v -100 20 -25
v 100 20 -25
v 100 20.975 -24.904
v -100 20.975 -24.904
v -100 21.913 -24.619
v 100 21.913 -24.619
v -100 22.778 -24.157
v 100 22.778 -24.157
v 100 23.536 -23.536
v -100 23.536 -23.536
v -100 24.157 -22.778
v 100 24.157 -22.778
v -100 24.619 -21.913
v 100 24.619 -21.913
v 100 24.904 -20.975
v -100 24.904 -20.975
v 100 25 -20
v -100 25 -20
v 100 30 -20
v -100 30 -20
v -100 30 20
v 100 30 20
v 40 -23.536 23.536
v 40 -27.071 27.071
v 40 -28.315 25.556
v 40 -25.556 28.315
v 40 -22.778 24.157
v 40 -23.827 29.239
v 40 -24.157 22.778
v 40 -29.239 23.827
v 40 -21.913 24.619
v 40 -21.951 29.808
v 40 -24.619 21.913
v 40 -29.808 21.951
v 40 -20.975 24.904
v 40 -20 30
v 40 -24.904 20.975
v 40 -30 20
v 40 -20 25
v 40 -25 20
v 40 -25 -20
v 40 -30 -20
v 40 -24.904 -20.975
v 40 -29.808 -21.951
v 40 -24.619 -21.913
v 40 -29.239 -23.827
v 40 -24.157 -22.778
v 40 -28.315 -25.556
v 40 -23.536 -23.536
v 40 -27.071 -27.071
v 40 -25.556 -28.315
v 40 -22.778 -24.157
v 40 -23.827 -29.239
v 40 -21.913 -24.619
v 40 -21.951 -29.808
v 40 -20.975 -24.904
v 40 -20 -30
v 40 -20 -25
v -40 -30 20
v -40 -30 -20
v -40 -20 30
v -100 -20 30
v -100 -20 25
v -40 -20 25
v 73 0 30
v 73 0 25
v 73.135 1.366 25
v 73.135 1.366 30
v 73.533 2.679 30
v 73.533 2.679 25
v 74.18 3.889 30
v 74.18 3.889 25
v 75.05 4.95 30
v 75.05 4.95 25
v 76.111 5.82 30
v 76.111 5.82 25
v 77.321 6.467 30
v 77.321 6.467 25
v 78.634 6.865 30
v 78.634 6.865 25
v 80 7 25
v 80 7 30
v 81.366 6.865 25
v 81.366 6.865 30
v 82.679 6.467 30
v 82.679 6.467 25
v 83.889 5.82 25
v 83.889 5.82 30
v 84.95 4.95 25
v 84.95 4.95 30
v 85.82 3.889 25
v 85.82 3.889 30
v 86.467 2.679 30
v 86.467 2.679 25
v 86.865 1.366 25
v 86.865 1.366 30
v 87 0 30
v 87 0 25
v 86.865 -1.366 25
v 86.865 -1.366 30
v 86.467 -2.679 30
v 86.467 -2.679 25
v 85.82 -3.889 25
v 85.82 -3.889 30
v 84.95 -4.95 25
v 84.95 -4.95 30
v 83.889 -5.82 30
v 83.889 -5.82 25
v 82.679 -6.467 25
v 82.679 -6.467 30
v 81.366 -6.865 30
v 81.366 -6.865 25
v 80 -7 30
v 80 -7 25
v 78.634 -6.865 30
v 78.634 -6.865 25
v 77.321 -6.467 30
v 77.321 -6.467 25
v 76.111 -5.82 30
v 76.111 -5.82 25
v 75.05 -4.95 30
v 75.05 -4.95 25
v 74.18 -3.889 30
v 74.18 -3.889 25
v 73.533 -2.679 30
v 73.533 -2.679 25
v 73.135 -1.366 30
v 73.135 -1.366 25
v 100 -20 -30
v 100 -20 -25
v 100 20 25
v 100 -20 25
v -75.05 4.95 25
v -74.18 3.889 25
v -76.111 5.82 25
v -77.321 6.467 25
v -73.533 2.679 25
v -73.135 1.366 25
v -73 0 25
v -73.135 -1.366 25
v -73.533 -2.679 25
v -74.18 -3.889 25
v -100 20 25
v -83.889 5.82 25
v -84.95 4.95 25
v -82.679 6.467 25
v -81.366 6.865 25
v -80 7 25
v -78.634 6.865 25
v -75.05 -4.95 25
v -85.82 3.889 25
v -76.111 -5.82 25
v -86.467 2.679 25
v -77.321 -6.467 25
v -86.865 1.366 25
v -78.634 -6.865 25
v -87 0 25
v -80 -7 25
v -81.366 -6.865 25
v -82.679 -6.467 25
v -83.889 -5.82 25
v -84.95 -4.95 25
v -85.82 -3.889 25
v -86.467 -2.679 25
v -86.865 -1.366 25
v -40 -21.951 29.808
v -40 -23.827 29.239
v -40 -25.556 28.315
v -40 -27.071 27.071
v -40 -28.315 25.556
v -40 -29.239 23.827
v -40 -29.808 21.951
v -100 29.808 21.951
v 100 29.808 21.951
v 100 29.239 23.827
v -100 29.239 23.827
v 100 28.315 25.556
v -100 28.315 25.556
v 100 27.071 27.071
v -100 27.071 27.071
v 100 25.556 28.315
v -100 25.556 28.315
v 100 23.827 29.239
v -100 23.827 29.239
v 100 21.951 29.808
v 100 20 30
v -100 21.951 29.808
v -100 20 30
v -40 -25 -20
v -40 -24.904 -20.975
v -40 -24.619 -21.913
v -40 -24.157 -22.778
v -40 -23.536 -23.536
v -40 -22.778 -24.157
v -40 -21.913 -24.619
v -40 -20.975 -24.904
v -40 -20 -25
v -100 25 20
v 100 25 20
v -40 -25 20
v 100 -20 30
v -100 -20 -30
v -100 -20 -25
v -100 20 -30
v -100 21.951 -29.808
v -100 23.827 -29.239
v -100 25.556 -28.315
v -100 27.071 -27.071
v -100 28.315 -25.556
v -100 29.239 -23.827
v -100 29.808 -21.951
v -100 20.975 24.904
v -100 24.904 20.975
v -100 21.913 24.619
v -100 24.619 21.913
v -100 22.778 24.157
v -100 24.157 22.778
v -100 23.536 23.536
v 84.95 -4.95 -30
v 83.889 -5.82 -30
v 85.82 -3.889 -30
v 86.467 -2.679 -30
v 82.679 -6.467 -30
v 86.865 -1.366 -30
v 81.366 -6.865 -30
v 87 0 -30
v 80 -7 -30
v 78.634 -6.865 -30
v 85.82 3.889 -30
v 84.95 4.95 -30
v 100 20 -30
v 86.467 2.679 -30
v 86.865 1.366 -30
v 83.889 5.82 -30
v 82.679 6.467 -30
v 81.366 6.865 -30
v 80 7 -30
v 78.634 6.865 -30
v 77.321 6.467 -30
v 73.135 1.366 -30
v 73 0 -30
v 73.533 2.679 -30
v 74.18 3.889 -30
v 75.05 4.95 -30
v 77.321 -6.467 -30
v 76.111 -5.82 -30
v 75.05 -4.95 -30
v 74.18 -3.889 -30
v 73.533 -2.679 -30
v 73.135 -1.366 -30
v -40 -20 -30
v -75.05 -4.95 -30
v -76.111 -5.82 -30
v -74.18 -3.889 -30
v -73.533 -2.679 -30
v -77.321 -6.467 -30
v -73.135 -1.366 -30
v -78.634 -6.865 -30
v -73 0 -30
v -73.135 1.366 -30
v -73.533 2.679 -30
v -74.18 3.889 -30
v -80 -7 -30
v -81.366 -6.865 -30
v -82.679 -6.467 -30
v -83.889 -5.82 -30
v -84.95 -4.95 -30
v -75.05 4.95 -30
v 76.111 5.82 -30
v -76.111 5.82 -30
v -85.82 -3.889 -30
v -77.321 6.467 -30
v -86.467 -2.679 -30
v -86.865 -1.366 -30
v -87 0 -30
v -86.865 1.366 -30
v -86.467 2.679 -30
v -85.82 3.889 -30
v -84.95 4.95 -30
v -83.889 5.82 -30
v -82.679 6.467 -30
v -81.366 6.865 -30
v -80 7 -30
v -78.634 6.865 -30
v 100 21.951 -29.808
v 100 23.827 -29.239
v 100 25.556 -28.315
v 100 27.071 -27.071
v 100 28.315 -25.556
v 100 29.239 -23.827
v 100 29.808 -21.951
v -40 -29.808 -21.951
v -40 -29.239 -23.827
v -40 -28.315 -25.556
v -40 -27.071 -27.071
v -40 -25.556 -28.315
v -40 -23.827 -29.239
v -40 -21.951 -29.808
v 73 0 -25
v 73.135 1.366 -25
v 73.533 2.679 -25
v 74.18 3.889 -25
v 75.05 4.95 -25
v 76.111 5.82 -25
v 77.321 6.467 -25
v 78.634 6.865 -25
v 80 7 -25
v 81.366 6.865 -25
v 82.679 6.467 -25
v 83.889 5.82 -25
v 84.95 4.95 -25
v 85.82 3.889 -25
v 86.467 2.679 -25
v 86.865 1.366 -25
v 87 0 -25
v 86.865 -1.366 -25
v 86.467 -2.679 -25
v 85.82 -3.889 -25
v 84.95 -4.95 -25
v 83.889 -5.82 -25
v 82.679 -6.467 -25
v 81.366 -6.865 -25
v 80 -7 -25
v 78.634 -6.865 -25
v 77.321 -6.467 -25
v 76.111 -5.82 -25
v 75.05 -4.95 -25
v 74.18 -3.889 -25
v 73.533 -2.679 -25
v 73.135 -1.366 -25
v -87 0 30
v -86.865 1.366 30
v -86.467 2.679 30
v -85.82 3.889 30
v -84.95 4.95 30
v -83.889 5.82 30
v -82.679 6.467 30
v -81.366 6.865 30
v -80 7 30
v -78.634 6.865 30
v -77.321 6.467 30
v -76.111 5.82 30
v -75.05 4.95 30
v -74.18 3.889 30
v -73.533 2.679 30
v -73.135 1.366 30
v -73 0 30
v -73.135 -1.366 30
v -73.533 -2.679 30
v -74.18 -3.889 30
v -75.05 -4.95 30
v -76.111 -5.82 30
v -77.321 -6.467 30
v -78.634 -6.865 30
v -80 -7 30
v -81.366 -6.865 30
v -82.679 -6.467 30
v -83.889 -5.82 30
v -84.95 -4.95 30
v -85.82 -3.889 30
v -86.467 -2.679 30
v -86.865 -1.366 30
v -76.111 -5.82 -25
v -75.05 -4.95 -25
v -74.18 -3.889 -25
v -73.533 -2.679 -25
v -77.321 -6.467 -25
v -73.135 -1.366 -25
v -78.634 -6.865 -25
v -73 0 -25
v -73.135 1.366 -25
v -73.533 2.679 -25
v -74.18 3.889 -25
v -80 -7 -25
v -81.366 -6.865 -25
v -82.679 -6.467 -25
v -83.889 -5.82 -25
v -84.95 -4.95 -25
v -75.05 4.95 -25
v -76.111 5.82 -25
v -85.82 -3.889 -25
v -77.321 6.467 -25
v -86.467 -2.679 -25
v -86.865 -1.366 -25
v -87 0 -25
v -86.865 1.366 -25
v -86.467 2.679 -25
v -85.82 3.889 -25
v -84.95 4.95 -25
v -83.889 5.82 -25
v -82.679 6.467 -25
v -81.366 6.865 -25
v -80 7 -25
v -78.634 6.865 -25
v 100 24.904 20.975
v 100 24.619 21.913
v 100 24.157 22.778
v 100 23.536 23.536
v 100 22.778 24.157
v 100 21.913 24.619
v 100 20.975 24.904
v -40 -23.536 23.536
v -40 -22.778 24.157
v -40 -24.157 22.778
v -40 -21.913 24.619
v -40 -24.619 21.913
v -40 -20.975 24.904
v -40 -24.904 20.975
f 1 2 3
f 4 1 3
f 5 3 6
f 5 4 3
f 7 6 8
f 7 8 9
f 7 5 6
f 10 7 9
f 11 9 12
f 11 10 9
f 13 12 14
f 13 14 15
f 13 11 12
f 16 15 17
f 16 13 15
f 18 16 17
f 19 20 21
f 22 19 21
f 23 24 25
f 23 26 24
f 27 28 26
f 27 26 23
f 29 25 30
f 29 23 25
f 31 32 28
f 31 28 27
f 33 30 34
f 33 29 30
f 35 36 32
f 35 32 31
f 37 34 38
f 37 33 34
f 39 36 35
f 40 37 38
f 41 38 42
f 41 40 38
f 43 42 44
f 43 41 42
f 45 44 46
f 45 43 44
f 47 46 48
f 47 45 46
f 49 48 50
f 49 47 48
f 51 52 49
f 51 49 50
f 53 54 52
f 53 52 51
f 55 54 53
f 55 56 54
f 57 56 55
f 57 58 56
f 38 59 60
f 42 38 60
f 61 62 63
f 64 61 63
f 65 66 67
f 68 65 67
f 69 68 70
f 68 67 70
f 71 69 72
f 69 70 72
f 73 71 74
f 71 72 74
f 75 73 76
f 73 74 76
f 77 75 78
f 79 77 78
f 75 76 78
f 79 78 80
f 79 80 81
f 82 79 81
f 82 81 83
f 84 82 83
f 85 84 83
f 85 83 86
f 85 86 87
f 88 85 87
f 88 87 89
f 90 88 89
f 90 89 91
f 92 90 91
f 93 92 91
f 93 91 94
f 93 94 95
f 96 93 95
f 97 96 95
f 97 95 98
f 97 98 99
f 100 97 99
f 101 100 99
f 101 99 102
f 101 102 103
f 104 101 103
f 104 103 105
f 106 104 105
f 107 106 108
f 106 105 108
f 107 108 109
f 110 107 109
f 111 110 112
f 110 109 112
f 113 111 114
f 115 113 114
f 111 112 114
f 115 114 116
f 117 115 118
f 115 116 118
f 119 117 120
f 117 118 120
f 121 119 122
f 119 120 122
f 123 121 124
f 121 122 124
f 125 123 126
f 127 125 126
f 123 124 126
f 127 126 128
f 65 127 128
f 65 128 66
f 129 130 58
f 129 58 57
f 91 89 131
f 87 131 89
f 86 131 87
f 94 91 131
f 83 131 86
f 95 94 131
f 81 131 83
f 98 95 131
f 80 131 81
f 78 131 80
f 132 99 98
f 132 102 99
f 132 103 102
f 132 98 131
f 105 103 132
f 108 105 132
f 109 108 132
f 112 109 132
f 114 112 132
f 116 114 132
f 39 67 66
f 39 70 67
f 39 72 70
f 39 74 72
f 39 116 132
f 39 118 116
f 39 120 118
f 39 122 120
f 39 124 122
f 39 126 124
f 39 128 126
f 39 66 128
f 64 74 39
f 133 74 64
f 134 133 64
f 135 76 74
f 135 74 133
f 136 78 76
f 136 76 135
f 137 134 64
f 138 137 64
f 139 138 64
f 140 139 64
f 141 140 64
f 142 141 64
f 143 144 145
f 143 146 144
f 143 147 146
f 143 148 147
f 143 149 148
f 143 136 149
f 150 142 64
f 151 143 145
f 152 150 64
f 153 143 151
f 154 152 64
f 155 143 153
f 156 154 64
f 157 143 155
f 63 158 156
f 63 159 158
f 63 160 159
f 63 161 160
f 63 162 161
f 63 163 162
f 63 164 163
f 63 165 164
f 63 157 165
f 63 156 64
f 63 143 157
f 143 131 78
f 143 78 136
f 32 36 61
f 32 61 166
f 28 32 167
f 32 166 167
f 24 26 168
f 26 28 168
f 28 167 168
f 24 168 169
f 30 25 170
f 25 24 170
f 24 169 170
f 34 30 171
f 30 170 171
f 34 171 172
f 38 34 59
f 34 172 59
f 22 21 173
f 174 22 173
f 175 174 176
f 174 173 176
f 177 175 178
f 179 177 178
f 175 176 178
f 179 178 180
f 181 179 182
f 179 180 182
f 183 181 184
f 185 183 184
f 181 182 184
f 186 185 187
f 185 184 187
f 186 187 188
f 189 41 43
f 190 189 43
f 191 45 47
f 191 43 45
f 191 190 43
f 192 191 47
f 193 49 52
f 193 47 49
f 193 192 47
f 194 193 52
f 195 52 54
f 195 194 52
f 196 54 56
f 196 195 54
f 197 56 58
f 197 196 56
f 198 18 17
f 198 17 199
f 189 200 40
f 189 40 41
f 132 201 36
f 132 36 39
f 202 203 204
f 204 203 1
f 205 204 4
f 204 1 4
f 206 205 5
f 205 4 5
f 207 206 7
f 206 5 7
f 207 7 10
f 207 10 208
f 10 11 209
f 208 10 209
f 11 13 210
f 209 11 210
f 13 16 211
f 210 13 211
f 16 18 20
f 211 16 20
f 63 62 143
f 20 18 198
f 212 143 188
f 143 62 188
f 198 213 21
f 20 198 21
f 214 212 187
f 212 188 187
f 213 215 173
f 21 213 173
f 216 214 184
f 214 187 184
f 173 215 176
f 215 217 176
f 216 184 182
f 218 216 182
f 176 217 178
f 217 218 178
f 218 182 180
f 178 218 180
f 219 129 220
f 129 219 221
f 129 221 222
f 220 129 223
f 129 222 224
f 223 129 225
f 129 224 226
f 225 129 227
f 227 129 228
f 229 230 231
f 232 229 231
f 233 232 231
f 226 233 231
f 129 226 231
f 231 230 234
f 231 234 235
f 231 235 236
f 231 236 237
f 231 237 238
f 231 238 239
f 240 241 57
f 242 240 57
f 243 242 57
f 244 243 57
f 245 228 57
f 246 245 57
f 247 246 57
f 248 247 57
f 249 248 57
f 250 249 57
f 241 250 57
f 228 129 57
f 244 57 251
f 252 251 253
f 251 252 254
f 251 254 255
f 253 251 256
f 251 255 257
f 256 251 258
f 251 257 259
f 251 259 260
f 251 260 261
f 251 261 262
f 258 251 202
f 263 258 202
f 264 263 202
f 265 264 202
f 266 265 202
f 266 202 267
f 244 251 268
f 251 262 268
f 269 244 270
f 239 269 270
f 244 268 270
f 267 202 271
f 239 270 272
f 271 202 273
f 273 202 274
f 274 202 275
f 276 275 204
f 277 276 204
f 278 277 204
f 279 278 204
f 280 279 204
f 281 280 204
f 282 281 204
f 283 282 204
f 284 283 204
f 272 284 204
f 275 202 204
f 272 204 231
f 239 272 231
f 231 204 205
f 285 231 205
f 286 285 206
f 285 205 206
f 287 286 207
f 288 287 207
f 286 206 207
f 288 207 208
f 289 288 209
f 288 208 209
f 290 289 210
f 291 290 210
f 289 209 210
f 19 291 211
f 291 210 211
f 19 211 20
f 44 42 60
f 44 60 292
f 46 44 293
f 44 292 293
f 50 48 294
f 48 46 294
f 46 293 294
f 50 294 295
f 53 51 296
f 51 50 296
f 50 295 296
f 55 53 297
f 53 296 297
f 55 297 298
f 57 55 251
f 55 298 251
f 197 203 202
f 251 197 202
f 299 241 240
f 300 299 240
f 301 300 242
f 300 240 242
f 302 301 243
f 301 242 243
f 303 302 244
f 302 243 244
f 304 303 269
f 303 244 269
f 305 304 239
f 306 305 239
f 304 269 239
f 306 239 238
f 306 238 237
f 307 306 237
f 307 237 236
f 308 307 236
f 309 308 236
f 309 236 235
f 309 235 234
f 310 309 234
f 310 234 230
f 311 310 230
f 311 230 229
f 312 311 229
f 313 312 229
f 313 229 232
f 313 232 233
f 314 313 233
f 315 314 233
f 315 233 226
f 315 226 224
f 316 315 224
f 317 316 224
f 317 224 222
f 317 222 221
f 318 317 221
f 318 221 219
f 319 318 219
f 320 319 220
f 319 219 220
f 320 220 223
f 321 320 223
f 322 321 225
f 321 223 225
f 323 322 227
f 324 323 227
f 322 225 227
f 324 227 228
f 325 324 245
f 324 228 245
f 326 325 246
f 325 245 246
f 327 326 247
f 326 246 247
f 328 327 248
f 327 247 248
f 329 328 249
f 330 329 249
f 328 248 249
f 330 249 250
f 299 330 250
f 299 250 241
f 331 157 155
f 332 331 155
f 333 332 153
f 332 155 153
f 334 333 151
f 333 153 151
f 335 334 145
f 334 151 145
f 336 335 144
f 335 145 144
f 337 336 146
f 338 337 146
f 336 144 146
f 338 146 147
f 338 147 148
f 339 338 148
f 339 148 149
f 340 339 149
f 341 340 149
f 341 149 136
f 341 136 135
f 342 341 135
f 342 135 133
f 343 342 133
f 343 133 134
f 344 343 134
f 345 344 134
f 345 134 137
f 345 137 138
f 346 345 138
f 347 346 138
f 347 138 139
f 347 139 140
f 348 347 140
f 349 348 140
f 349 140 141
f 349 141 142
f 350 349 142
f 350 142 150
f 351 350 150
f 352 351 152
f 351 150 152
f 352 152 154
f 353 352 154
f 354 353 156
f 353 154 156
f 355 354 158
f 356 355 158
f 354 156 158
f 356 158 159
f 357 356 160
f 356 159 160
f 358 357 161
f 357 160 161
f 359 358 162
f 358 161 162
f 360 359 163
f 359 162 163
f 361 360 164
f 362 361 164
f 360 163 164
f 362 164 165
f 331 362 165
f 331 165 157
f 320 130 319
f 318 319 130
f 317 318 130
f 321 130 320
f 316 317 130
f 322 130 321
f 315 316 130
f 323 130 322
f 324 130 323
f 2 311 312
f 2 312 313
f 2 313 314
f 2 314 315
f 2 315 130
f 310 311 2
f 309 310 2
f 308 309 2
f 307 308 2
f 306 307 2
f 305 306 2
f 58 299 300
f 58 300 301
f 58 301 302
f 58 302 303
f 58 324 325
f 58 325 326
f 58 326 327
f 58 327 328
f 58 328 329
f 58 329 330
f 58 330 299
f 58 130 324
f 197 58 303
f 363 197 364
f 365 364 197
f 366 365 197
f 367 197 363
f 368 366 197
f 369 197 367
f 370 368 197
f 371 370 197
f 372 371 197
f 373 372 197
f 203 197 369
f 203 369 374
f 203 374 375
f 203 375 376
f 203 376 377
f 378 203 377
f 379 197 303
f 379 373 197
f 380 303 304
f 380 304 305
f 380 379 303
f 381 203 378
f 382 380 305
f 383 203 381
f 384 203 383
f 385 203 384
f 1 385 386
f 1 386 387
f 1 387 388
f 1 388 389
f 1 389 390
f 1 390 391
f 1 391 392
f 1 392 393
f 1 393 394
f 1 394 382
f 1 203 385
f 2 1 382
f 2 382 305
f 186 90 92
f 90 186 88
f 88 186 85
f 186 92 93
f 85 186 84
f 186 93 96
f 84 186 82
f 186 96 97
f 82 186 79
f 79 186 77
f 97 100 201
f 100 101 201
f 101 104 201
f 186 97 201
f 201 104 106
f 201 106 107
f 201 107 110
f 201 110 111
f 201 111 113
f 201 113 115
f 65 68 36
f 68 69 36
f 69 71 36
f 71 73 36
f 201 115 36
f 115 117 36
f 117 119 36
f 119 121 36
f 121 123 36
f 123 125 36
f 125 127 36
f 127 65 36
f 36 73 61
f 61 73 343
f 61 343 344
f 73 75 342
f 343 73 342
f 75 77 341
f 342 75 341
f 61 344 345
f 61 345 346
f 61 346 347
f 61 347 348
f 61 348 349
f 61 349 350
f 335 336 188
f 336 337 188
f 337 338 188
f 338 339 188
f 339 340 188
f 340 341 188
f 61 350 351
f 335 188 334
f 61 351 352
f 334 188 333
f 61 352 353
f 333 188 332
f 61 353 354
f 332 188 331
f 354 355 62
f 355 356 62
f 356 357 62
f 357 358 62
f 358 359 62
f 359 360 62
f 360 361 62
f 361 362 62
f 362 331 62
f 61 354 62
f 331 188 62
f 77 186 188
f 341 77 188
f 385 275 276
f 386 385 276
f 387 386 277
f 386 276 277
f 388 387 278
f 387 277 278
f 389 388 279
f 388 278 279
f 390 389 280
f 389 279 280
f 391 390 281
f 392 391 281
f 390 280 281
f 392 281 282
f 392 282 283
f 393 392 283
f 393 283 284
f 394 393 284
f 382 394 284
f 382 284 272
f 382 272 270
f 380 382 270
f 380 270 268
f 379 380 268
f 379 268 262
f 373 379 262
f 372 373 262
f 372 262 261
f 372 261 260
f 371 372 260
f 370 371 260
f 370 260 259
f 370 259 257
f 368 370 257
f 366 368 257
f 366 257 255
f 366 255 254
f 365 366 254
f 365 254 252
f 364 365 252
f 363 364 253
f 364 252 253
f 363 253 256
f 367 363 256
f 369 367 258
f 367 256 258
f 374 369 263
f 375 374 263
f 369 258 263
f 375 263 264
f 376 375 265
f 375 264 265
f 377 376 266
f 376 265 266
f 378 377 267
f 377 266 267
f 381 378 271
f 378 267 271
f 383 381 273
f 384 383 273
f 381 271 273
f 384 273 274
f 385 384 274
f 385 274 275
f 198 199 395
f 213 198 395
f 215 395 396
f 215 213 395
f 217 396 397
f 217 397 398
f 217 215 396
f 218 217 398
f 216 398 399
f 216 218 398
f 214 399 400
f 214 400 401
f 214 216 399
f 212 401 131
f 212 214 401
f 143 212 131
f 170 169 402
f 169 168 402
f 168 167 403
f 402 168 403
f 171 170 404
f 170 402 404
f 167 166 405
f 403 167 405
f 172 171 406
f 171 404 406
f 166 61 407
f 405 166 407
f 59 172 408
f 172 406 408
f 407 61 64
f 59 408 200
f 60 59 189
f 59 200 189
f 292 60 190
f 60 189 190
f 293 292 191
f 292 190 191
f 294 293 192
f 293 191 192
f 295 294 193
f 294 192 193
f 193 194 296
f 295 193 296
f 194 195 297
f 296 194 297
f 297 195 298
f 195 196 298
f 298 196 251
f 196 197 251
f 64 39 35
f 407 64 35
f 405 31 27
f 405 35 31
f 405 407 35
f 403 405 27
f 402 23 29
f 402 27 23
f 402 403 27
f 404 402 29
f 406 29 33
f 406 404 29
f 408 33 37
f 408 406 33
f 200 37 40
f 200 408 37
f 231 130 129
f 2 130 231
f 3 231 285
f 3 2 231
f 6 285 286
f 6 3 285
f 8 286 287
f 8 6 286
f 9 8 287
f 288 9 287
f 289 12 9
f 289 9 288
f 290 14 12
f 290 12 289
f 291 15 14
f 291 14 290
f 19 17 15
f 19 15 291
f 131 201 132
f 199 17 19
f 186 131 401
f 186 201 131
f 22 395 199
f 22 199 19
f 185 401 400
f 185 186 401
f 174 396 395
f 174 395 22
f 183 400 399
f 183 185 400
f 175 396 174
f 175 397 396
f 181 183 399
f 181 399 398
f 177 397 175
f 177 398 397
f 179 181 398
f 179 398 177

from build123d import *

# Parameters (mm, degrees)
EL_MENT_M_CANO_SOUD_1_DEPTH     = 200
ESQUISSE2_W                     = 60
ESQUISSE2_H                     = 10
ENL_V_MAT_EXTRU_1_DEPTH         = 60
DIAM_TRE_DU_PER_AGE_14_0_14_1_D = 14


with BuildPart() as part:
    # Sketch1 → Elément mécano-soudé1 (new body)
    with BuildSketch(Plane.YZ.offset(-100)):
        with BuildLine():
            Line((-20, -30), (20, -30))
            ThreePointArc((20, -30), (27.071067812, -27.071067812), (30, -20))
            Line((30, -20), (30, 20))
            ThreePointArc((30, 20), (27.071067812, 27.071067812), (20, 30))
            Line((20, 30), (-20, 30))
            ThreePointArc((-20, 30), (-27.071067812, 27.071067812), (-30, 20))
            Line((-30, 20), (-30, -20))
            ThreePointArc((-30, -20), (-27.071067812, -27.071067812), (-20, -30))
        make_face()
        with BuildLine():
            Line((-20, -25), (20, -25))
            ThreePointArc((20, -25), (23.535533906, -23.535533906), (25, -20))
            Line((25, -20), (25, 20))
            ThreePointArc((25, 20), (23.535533906, 23.535533906), (20, 25))
            Line((20, 25), (-20, 25))
            ThreePointArc((-20, 25), (-23.535533906, 23.535533906), (-25, 20))
            Line((-25, 20), (-25, -20))
            ThreePointArc((-25, -20), (-23.535533906, -23.535533906), (-20, -25))
        make_face(mode=Mode.SUBTRACT)
    extrude(amount=EL_MENT_M_CANO_SOUD_1_DEPTH)

    # Esquisse2 → Enlèv. mat.-Extru.1 (cut)
    with BuildSketch(Plane(origin=(-100, 0, 0), x_dir=(0, 0, -1), z_dir=(1, 0, 0))):
        with Locations((0, -25)):
            Rectangle(ESQUISSE2_W, ESQUISSE2_H)
    enl_v_mat_extru_1 = extrude(amount=ENL_V_MAT_EXTRU_1_DEPTH, mode=Mode.SUBTRACT)

    # Diamètre du perçage Ø14.0 (14)1 (through all)
    with Locations(Plane.XY.offset(30)):
        with Locations((-80, 0), (80, 0)):
            Hole(DIAM_TRE_DU_PER_AGE_14_0_14_1_D / 2)

    # Symétrie1: Enlèv. mat.-Extru.1 across plane
    add(enl_v_mat_extru_1.mirror(Plane(origin=(0, 0, 0), x_dir=(0, 0, 1), z_dir=(1, 0, 0))), mode=Mode.SUBTRACT)


solid = part.part
